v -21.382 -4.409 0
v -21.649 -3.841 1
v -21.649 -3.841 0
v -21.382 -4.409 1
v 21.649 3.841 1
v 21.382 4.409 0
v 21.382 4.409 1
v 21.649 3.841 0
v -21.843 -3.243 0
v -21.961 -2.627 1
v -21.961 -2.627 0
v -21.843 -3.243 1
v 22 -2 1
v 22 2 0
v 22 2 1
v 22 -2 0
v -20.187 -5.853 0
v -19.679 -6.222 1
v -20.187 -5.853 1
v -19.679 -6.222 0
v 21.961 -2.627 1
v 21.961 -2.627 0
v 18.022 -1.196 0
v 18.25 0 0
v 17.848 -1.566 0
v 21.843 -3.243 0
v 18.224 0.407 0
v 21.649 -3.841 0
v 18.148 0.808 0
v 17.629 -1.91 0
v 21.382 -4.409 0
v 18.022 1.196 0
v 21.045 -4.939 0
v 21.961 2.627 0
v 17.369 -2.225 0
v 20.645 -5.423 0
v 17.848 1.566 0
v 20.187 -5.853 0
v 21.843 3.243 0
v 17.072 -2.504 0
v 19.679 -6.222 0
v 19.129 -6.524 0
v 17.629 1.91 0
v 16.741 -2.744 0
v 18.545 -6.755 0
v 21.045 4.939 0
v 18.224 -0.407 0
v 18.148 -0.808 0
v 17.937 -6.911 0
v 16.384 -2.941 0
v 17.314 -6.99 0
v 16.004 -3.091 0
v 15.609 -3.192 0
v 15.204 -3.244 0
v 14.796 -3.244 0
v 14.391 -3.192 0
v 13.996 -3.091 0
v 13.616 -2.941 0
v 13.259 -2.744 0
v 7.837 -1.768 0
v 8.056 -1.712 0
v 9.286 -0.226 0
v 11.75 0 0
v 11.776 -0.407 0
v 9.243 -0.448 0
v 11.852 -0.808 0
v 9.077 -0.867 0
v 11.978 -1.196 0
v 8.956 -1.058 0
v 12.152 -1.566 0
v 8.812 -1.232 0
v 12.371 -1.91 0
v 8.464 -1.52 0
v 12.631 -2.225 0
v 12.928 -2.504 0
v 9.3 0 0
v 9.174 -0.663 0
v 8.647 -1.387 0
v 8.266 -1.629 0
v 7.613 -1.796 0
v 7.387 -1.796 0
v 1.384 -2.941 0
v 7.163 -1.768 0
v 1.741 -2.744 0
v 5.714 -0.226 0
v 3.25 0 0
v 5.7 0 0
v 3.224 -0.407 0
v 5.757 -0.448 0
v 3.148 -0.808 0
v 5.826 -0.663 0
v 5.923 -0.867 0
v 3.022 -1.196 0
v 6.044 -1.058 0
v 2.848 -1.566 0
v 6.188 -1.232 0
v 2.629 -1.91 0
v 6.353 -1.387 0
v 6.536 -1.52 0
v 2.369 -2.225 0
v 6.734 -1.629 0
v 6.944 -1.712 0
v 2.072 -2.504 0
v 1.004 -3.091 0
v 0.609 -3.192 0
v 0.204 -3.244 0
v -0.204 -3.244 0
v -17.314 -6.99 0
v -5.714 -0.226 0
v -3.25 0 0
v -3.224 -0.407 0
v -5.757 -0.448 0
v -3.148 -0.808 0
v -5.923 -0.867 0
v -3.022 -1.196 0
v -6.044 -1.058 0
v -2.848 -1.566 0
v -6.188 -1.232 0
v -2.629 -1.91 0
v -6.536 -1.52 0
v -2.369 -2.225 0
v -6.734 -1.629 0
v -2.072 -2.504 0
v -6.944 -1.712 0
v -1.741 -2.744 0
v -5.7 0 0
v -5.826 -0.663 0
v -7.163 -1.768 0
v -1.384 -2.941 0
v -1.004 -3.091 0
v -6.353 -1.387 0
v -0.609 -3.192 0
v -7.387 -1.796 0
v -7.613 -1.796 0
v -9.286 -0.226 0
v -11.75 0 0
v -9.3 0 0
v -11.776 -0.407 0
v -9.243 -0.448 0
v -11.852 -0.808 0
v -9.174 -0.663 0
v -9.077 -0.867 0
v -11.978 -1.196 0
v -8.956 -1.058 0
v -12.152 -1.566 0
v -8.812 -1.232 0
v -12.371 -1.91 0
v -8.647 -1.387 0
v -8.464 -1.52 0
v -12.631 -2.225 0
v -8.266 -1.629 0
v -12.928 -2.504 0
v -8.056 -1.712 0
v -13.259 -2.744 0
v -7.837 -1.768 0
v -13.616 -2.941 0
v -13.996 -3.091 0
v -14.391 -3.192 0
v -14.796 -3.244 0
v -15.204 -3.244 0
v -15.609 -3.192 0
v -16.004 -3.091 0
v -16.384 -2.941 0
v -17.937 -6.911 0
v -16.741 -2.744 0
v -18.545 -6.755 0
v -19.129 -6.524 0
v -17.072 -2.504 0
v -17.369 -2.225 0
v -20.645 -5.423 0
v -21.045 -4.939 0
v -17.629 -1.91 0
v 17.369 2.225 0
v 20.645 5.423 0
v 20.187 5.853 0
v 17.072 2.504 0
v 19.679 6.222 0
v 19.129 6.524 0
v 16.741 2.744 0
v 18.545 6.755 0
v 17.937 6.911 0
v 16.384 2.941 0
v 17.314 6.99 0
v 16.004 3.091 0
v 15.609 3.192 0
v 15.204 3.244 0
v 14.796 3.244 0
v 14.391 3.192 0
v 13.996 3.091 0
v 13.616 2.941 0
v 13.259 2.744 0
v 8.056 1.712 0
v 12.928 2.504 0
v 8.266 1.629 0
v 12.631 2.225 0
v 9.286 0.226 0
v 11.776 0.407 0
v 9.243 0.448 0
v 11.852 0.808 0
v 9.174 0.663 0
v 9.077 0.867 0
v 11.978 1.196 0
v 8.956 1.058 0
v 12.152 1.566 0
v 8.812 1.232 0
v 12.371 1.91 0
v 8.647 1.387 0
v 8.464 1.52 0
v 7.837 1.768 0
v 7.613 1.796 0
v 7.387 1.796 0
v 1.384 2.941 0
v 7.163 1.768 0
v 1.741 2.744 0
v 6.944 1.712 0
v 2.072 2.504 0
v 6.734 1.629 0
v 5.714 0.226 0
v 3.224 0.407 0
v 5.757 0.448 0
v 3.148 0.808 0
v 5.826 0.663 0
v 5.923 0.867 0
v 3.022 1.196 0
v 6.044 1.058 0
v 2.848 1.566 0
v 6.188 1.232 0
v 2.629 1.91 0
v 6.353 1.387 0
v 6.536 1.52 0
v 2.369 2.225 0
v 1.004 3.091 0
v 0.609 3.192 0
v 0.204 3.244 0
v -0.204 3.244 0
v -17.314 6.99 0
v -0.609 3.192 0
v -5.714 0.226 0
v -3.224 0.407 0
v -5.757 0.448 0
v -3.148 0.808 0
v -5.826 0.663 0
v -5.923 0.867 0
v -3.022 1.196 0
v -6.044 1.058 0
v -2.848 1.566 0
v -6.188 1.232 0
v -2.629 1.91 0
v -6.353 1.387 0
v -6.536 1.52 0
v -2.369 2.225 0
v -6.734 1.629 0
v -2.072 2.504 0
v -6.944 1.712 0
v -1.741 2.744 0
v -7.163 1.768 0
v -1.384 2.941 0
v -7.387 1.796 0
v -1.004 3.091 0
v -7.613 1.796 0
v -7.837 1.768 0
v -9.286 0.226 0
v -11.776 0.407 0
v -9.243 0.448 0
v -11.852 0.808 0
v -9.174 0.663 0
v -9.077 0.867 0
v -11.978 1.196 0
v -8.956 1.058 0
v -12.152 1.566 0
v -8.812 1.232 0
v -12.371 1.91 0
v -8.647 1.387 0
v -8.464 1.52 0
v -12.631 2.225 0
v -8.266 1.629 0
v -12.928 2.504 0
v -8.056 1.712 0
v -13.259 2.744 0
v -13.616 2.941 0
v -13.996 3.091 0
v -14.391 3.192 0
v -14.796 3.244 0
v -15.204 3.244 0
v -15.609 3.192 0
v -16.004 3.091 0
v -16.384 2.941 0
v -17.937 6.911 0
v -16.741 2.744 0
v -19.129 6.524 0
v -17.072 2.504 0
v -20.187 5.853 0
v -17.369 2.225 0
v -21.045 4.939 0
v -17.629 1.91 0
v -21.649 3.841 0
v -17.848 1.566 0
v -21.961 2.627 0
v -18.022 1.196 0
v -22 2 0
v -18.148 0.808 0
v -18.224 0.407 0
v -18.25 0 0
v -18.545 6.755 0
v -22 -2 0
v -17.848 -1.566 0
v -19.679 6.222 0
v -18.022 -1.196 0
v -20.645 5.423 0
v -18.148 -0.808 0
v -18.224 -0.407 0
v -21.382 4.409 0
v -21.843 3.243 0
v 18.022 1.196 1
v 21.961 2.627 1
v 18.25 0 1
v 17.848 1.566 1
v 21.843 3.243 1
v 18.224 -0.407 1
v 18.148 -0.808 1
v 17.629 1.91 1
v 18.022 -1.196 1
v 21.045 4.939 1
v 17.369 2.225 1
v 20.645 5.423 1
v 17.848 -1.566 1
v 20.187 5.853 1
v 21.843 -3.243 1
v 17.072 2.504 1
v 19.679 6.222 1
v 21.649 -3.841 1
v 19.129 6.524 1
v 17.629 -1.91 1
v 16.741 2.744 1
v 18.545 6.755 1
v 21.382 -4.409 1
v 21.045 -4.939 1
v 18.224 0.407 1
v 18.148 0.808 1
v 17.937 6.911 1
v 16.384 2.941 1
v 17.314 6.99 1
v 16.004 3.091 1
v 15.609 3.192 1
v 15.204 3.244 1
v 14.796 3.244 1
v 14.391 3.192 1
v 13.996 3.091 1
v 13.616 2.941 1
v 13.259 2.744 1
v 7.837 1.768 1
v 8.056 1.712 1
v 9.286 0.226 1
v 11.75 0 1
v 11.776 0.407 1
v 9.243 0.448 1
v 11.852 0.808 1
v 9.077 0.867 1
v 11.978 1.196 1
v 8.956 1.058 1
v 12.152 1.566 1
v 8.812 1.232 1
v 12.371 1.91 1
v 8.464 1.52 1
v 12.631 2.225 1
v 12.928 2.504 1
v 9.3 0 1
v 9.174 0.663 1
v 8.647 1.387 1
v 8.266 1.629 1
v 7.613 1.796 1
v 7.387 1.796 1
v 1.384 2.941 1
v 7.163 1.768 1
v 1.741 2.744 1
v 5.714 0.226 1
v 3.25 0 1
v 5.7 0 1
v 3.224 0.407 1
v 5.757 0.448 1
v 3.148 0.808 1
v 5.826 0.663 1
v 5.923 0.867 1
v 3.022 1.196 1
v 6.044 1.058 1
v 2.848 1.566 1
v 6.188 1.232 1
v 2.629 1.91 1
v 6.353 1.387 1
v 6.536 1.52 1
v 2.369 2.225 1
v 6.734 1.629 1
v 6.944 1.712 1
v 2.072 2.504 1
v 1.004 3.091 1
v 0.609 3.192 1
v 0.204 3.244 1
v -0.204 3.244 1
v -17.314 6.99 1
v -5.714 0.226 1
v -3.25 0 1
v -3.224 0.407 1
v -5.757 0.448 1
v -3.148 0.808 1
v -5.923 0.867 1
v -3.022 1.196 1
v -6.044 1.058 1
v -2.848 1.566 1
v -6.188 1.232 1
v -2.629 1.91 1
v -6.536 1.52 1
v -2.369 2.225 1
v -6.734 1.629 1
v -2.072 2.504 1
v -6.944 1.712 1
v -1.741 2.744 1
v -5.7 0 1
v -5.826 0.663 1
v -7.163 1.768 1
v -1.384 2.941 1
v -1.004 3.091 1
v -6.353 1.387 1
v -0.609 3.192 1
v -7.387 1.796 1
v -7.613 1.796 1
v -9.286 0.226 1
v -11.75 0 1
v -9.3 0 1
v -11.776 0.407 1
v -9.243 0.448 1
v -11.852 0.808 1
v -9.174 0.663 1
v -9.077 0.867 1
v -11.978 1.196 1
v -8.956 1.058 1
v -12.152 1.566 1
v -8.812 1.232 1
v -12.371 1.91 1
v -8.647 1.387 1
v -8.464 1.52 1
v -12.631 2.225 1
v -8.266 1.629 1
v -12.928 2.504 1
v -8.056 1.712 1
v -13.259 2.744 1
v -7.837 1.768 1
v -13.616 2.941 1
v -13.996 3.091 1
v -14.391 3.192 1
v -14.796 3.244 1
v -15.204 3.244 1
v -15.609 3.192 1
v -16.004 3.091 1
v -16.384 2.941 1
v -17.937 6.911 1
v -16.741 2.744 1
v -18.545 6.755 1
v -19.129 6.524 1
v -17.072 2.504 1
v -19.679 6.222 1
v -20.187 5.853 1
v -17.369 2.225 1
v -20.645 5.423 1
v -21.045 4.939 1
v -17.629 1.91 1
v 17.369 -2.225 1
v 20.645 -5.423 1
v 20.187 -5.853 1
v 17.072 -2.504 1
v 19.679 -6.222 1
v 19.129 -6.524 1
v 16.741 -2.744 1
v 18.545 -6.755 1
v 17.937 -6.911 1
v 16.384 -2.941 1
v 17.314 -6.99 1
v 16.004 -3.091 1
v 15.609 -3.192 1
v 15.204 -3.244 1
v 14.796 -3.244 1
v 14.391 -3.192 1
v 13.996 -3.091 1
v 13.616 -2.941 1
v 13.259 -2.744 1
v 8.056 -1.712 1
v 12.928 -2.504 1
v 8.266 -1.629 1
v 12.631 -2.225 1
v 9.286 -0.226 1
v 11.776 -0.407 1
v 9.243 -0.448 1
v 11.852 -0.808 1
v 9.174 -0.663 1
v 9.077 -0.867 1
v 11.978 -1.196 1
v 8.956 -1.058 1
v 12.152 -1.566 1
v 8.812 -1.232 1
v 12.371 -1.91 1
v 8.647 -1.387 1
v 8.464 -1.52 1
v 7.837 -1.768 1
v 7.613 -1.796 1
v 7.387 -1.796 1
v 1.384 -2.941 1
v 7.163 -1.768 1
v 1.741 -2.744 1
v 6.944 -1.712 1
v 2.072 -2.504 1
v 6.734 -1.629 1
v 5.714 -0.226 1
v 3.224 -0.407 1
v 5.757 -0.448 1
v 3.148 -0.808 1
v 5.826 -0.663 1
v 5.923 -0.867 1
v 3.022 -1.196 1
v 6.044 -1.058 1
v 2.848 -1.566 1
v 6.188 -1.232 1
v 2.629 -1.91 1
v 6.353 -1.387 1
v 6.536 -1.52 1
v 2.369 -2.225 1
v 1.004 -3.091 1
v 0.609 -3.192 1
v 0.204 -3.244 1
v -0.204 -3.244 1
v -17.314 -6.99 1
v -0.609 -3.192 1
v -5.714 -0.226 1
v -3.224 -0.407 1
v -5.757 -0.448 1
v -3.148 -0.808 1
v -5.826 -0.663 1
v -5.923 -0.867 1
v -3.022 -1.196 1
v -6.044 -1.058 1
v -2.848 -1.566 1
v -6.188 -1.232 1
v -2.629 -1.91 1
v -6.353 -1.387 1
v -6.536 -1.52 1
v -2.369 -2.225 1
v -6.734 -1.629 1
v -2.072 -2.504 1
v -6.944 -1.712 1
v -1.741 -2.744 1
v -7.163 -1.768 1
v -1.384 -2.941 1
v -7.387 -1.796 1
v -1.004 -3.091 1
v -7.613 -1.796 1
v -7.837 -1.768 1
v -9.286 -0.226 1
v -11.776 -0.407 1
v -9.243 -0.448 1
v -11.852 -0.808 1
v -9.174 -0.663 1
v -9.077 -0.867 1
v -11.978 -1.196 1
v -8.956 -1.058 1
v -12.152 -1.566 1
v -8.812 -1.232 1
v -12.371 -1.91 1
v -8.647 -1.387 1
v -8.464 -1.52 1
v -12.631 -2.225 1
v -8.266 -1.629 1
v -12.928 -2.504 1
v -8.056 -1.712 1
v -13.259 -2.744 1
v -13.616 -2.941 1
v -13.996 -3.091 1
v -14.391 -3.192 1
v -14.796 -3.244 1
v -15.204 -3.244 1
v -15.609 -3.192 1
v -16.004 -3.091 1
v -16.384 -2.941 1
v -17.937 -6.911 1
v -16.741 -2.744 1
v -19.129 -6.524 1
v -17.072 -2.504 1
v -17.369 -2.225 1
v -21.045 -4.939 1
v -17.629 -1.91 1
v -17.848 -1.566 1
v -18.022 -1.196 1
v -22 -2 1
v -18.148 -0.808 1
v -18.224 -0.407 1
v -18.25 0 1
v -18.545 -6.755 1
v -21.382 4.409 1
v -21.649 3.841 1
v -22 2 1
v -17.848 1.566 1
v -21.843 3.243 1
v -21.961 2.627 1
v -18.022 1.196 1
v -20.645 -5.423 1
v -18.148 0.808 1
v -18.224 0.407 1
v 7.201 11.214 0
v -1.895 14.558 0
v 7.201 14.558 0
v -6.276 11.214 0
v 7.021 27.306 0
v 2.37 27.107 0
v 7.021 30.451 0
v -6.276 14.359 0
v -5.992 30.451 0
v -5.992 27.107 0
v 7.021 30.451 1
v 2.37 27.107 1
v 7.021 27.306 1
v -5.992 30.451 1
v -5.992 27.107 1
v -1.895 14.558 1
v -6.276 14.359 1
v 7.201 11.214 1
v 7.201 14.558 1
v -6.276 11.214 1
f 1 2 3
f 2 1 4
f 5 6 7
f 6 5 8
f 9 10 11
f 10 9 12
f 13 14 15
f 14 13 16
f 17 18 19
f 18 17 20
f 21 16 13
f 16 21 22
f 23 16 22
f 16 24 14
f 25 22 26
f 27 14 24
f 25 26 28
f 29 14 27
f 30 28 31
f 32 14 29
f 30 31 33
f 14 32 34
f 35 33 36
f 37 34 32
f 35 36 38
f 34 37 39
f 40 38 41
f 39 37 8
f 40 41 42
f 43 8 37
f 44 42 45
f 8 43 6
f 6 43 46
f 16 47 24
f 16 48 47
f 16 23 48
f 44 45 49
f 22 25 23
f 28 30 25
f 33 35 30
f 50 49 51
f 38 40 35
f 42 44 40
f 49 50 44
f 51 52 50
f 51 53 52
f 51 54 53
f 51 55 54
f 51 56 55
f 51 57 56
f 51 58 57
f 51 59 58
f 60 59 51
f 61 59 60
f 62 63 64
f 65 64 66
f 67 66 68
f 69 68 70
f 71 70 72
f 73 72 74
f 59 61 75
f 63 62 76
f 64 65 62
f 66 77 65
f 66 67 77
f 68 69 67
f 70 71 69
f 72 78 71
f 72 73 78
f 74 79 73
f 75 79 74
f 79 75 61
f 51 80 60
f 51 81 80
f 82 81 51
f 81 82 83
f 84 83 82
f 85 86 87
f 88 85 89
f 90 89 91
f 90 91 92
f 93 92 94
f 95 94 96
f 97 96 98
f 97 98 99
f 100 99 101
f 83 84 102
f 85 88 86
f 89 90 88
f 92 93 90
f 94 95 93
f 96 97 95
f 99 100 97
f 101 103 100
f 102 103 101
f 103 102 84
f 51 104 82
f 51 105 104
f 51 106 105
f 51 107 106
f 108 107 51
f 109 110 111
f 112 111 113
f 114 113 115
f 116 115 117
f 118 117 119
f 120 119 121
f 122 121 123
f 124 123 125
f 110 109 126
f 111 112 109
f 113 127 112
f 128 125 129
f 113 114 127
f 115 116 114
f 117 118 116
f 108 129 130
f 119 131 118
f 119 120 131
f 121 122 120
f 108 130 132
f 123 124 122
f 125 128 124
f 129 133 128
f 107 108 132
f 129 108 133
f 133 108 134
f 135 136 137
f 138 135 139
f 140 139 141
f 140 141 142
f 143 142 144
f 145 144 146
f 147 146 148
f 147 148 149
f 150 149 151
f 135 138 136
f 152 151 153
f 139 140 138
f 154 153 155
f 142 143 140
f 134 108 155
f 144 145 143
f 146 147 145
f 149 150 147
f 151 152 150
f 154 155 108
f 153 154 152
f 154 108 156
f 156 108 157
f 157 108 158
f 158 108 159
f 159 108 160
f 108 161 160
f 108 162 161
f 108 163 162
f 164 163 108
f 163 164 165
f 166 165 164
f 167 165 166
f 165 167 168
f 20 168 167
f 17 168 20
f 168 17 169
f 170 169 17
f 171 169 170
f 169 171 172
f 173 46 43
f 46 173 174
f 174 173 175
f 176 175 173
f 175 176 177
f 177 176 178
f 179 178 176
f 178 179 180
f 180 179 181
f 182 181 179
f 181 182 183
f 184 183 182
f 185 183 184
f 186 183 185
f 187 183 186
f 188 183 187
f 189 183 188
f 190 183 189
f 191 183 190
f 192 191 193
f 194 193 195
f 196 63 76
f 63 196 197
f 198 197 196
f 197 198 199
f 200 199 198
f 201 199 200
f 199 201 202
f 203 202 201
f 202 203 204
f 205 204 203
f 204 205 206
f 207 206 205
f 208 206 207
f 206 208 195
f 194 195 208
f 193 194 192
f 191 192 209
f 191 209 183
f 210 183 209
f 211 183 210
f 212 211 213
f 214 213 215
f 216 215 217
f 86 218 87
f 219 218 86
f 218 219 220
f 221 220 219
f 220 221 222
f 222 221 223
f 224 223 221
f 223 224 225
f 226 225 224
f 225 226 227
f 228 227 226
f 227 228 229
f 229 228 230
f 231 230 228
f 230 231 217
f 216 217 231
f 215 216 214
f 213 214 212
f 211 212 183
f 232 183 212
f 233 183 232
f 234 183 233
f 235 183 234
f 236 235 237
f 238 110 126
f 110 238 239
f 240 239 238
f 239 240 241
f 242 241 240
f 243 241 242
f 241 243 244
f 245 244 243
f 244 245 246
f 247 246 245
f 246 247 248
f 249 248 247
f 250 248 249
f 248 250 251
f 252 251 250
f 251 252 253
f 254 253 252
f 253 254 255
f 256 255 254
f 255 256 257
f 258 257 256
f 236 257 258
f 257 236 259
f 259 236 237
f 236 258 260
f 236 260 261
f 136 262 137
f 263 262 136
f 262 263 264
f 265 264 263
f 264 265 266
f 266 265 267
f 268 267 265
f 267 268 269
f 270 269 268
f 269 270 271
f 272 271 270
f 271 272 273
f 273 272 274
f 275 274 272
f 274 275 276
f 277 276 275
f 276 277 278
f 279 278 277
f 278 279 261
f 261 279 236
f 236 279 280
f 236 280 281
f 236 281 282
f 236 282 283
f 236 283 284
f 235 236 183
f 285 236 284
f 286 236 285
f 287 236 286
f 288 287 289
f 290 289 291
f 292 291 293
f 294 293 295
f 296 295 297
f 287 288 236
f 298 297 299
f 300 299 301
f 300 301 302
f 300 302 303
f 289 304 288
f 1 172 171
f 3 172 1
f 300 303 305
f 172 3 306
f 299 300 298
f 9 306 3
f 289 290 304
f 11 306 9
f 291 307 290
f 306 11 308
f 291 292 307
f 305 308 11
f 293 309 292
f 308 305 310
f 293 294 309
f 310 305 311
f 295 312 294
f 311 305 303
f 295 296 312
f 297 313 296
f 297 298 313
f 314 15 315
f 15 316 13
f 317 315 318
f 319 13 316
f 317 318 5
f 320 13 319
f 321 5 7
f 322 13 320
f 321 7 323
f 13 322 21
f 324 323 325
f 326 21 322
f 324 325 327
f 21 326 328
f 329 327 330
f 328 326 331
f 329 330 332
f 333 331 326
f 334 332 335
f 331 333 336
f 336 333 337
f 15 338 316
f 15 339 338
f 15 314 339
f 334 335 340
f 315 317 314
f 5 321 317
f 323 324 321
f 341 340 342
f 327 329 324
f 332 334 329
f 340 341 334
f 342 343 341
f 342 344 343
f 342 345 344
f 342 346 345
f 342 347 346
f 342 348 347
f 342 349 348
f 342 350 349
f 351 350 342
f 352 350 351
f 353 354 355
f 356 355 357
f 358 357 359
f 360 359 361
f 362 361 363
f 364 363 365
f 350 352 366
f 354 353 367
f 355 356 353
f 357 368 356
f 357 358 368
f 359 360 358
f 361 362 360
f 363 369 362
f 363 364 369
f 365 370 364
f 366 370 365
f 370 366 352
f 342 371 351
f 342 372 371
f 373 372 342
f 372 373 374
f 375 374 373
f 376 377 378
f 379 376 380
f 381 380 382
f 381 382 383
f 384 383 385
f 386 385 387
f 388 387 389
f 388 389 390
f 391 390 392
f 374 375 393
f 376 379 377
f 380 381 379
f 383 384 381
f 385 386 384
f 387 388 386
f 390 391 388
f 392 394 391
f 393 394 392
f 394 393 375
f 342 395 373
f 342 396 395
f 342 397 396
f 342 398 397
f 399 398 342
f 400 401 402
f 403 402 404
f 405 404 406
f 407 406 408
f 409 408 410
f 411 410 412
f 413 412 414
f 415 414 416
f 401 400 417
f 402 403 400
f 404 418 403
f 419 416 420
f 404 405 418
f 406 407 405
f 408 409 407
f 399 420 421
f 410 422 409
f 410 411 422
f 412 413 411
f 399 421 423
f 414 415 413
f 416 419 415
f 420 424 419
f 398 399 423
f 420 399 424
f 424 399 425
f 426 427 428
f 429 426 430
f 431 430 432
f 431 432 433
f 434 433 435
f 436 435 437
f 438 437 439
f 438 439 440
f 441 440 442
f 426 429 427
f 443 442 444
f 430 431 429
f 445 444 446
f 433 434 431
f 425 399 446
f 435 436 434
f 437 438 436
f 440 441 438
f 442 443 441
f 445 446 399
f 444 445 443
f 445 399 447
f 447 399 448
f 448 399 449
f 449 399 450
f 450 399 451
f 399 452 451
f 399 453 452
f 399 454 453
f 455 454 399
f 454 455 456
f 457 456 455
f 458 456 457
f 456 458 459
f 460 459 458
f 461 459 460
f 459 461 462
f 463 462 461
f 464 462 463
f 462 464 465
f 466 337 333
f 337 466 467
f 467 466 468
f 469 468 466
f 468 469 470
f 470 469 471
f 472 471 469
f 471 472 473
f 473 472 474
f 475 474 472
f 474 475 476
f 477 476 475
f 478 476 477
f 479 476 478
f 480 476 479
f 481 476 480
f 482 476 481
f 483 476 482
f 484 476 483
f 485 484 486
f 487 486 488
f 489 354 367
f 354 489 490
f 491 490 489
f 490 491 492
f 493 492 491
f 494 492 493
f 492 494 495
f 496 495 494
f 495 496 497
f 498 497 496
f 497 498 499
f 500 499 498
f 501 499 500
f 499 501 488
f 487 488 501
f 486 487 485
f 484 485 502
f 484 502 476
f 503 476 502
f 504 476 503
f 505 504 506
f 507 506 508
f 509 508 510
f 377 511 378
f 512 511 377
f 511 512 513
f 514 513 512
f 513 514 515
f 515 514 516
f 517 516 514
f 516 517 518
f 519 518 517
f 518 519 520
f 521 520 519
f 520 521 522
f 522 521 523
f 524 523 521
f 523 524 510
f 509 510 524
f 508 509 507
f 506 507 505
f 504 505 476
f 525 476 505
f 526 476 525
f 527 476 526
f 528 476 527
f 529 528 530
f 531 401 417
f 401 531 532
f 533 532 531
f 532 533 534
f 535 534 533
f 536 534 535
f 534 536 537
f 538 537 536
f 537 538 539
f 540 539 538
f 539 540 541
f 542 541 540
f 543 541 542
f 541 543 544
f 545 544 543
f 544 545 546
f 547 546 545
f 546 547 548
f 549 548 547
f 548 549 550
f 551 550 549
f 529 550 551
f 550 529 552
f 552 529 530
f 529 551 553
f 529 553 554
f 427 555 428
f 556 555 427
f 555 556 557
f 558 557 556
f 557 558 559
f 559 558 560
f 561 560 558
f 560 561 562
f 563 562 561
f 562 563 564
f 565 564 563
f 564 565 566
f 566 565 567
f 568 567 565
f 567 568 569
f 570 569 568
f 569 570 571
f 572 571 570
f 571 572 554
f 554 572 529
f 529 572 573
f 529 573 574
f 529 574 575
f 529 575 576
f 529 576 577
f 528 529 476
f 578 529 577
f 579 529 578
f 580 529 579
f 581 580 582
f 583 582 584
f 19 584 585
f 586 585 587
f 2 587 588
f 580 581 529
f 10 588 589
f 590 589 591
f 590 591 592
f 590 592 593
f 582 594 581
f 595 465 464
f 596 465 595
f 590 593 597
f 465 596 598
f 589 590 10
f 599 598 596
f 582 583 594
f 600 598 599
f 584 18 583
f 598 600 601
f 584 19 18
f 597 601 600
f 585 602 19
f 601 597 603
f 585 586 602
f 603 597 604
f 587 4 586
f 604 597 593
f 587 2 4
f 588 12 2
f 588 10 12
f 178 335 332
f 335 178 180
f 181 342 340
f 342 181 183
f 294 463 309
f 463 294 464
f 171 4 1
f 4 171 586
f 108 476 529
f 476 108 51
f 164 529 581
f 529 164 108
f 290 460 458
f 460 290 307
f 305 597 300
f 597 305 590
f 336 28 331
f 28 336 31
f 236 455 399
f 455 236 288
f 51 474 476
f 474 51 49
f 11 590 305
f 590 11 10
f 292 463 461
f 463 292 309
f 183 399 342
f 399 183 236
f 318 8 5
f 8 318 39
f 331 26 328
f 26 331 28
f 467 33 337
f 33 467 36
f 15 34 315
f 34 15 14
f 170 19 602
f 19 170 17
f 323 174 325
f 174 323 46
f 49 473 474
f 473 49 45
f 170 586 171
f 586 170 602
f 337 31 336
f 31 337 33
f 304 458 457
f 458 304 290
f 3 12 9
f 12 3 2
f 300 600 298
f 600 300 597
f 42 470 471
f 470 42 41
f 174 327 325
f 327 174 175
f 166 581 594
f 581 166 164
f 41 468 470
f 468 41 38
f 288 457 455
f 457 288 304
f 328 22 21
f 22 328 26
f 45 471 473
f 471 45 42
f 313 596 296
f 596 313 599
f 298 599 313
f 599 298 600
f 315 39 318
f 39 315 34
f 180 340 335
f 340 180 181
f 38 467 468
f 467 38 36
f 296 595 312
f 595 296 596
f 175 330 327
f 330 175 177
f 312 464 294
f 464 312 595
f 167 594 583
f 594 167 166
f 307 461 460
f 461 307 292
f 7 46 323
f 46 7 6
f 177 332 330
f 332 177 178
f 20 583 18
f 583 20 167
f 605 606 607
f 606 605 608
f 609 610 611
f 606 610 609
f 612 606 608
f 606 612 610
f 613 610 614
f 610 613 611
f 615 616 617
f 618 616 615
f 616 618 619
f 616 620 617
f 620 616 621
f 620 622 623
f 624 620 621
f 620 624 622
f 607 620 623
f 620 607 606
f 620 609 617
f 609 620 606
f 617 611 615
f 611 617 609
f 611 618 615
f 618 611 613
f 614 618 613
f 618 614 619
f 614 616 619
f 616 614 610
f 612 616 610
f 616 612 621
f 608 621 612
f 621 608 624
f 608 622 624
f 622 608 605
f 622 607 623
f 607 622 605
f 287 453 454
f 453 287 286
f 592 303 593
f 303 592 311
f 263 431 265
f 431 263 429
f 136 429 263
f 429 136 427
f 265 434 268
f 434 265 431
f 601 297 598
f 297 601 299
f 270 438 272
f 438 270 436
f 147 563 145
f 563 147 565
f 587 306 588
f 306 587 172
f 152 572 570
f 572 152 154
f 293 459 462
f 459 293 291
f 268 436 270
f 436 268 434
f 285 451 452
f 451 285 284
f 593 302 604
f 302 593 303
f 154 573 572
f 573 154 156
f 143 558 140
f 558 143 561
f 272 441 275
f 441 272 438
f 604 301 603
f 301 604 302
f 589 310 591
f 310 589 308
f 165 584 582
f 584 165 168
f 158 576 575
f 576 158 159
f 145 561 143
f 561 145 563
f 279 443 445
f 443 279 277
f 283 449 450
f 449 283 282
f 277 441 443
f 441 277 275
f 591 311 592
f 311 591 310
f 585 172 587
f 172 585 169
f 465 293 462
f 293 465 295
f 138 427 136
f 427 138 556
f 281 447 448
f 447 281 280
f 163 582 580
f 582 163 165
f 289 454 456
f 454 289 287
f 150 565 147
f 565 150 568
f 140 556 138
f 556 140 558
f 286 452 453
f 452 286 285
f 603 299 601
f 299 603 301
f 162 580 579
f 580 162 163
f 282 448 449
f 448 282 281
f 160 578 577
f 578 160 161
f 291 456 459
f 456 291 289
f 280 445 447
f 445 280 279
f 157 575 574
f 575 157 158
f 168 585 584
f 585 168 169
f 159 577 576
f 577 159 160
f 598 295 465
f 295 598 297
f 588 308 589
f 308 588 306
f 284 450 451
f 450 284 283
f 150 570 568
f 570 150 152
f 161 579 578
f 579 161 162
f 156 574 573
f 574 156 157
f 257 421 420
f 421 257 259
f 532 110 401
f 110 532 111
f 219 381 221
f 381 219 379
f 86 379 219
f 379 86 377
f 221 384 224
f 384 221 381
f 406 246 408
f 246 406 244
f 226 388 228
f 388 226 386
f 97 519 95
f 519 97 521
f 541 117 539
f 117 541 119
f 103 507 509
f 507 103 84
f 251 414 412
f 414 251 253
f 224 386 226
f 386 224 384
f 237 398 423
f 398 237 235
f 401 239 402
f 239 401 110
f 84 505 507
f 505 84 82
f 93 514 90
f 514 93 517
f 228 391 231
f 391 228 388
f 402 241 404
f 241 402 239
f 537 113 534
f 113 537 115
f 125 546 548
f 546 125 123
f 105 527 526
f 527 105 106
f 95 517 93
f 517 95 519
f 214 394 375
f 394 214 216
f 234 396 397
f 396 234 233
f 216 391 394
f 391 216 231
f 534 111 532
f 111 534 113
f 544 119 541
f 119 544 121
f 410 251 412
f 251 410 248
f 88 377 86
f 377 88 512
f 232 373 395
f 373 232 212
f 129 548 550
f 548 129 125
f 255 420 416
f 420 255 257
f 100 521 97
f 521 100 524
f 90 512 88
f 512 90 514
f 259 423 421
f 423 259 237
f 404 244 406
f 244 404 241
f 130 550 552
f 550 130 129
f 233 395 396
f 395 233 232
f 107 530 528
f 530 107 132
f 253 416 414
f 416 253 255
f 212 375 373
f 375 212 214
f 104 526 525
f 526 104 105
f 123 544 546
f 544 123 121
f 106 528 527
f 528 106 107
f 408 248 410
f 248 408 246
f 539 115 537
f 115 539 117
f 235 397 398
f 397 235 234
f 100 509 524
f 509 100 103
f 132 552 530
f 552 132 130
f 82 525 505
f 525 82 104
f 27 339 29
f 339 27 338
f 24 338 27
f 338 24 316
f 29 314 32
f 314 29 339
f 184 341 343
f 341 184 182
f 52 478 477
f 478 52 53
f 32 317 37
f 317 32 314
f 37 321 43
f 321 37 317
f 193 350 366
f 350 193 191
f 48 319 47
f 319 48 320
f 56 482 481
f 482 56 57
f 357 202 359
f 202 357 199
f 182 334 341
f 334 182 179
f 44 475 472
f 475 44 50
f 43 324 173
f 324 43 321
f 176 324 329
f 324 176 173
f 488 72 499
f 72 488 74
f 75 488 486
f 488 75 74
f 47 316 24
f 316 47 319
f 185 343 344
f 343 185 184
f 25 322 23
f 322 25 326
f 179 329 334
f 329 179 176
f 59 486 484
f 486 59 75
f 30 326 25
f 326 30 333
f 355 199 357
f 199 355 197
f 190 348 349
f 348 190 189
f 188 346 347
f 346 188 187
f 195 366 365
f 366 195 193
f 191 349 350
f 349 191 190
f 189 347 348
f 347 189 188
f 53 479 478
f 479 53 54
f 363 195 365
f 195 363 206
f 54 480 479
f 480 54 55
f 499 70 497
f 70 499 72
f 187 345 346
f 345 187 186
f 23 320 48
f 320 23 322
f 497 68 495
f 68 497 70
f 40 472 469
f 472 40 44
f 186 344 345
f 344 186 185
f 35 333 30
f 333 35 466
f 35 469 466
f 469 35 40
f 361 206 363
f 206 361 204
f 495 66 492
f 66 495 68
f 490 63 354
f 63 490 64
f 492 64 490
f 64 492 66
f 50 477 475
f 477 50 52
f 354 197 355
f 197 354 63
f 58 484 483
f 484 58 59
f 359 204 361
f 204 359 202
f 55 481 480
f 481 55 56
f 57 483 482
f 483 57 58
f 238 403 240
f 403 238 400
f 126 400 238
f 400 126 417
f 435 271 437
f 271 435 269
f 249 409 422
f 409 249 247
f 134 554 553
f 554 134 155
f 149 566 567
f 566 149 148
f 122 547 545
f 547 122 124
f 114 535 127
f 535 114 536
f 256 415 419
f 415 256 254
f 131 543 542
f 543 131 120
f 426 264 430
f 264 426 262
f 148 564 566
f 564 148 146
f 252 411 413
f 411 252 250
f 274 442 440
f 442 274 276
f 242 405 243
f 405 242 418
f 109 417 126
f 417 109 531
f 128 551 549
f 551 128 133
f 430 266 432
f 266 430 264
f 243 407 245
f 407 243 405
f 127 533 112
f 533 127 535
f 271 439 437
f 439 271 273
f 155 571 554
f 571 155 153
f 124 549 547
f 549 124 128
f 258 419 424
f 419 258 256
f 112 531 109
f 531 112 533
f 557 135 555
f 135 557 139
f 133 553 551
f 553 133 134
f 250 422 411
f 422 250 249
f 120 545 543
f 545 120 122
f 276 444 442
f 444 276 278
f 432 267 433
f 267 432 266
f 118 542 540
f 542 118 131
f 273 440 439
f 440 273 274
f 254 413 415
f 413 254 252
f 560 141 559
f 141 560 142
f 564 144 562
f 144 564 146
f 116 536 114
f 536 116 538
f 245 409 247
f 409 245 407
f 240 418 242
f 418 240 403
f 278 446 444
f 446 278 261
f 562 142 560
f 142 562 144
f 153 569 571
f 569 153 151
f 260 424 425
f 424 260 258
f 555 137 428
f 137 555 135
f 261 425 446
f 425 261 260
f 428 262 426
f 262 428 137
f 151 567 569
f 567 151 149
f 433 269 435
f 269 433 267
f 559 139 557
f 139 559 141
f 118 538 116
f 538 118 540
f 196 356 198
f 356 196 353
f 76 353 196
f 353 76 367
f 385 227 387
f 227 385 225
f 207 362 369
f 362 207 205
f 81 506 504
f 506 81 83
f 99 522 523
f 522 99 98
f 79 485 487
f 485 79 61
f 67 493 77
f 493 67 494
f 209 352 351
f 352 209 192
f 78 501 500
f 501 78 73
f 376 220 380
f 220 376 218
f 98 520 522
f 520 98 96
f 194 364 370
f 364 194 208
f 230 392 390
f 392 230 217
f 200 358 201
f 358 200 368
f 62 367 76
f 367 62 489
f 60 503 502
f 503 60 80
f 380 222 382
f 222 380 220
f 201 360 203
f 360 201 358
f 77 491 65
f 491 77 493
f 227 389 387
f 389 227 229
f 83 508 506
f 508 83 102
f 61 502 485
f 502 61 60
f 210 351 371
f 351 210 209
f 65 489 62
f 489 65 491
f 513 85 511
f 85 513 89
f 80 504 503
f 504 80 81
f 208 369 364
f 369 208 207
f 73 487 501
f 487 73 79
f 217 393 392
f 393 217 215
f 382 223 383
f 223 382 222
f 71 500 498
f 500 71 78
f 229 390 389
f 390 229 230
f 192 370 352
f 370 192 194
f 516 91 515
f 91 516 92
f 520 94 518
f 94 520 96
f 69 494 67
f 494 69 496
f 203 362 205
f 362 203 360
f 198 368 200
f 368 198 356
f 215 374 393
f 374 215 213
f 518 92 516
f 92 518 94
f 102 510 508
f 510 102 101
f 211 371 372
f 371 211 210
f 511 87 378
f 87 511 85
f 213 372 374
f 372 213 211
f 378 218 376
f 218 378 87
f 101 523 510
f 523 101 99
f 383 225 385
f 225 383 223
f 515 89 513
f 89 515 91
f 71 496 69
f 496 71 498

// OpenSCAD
$fn = 50;


difference() {
	union() {
		hull() {
			translate(v = [-17.0000000000, 2.0000000000, 0]) {
				cylinder(h = 1, r = 5);
			}
			translate(v = [17.0000000000, 2.0000000000, 0]) {
				cylinder(h = 1, r = 5);
			}
			translate(v = [-17.0000000000, -2.0000000000, 0]) {
				cylinder(h = 1, r = 5);
			}
			translate(v = [17.0000000000, -2.0000000000, 0]) {
				cylinder(h = 1, r = 5);
			}
		}
		translate(v = [0, 30.0000000000, 0]) {
			linear_extrude(height = 1) {
				text(font = "DejaVu Sans Mono:style=Bold", halign = "center", size = 19.0000000000, text = "Z", valign = "top");
			}
		}
	}
	union() {
		translate(v = [-15.0000000000, 0.0000000000, 0]) {
			translate(v = [0, 0, -100]) {
				cylinder(h = 200, r = 3.2500000000);
			}
		}
		translate(v = [0, 0, -100]) {
			cylinder(h = 200, r = 3.2500000000);
		}
		translate(v = [15.0000000000, 0.0000000000, 0]) {
			translate(v = [0, 0, -100]) {
				cylinder(h = 200, r = 3.2500000000);
			}
		}
		translate(v = [-15.0000000000, 0.0000000000, 0]) {
			translate(v = [0, 0, -100]) {
				cylinder(h = 200, r = 1.8000000000);
			}
		}
		translate(v = [-7.5000000000, 0.0000000000, 0]) {
			translate(v = [0, 0, -100]) {
				cylinder(h = 200, r = 1.8000000000);
			}
		}
		translate(v = [0, 0, -100]) {
			cylinder(h = 200, r = 1.8000000000);
		}
		translate(v = [7.5000000000, 0.0000000000, 0]) {
			translate(v = [0, 0, -100]) {
				cylinder(h = 200, r = 1.8000000000);
			}
		}
		translate(v = [15.0000000000, 0.0000000000, 0]) {
			translate(v = [0, 0, -100]) {
				cylinder(h = 200, r = 1.8000000000);
			}
		}
	}
}
